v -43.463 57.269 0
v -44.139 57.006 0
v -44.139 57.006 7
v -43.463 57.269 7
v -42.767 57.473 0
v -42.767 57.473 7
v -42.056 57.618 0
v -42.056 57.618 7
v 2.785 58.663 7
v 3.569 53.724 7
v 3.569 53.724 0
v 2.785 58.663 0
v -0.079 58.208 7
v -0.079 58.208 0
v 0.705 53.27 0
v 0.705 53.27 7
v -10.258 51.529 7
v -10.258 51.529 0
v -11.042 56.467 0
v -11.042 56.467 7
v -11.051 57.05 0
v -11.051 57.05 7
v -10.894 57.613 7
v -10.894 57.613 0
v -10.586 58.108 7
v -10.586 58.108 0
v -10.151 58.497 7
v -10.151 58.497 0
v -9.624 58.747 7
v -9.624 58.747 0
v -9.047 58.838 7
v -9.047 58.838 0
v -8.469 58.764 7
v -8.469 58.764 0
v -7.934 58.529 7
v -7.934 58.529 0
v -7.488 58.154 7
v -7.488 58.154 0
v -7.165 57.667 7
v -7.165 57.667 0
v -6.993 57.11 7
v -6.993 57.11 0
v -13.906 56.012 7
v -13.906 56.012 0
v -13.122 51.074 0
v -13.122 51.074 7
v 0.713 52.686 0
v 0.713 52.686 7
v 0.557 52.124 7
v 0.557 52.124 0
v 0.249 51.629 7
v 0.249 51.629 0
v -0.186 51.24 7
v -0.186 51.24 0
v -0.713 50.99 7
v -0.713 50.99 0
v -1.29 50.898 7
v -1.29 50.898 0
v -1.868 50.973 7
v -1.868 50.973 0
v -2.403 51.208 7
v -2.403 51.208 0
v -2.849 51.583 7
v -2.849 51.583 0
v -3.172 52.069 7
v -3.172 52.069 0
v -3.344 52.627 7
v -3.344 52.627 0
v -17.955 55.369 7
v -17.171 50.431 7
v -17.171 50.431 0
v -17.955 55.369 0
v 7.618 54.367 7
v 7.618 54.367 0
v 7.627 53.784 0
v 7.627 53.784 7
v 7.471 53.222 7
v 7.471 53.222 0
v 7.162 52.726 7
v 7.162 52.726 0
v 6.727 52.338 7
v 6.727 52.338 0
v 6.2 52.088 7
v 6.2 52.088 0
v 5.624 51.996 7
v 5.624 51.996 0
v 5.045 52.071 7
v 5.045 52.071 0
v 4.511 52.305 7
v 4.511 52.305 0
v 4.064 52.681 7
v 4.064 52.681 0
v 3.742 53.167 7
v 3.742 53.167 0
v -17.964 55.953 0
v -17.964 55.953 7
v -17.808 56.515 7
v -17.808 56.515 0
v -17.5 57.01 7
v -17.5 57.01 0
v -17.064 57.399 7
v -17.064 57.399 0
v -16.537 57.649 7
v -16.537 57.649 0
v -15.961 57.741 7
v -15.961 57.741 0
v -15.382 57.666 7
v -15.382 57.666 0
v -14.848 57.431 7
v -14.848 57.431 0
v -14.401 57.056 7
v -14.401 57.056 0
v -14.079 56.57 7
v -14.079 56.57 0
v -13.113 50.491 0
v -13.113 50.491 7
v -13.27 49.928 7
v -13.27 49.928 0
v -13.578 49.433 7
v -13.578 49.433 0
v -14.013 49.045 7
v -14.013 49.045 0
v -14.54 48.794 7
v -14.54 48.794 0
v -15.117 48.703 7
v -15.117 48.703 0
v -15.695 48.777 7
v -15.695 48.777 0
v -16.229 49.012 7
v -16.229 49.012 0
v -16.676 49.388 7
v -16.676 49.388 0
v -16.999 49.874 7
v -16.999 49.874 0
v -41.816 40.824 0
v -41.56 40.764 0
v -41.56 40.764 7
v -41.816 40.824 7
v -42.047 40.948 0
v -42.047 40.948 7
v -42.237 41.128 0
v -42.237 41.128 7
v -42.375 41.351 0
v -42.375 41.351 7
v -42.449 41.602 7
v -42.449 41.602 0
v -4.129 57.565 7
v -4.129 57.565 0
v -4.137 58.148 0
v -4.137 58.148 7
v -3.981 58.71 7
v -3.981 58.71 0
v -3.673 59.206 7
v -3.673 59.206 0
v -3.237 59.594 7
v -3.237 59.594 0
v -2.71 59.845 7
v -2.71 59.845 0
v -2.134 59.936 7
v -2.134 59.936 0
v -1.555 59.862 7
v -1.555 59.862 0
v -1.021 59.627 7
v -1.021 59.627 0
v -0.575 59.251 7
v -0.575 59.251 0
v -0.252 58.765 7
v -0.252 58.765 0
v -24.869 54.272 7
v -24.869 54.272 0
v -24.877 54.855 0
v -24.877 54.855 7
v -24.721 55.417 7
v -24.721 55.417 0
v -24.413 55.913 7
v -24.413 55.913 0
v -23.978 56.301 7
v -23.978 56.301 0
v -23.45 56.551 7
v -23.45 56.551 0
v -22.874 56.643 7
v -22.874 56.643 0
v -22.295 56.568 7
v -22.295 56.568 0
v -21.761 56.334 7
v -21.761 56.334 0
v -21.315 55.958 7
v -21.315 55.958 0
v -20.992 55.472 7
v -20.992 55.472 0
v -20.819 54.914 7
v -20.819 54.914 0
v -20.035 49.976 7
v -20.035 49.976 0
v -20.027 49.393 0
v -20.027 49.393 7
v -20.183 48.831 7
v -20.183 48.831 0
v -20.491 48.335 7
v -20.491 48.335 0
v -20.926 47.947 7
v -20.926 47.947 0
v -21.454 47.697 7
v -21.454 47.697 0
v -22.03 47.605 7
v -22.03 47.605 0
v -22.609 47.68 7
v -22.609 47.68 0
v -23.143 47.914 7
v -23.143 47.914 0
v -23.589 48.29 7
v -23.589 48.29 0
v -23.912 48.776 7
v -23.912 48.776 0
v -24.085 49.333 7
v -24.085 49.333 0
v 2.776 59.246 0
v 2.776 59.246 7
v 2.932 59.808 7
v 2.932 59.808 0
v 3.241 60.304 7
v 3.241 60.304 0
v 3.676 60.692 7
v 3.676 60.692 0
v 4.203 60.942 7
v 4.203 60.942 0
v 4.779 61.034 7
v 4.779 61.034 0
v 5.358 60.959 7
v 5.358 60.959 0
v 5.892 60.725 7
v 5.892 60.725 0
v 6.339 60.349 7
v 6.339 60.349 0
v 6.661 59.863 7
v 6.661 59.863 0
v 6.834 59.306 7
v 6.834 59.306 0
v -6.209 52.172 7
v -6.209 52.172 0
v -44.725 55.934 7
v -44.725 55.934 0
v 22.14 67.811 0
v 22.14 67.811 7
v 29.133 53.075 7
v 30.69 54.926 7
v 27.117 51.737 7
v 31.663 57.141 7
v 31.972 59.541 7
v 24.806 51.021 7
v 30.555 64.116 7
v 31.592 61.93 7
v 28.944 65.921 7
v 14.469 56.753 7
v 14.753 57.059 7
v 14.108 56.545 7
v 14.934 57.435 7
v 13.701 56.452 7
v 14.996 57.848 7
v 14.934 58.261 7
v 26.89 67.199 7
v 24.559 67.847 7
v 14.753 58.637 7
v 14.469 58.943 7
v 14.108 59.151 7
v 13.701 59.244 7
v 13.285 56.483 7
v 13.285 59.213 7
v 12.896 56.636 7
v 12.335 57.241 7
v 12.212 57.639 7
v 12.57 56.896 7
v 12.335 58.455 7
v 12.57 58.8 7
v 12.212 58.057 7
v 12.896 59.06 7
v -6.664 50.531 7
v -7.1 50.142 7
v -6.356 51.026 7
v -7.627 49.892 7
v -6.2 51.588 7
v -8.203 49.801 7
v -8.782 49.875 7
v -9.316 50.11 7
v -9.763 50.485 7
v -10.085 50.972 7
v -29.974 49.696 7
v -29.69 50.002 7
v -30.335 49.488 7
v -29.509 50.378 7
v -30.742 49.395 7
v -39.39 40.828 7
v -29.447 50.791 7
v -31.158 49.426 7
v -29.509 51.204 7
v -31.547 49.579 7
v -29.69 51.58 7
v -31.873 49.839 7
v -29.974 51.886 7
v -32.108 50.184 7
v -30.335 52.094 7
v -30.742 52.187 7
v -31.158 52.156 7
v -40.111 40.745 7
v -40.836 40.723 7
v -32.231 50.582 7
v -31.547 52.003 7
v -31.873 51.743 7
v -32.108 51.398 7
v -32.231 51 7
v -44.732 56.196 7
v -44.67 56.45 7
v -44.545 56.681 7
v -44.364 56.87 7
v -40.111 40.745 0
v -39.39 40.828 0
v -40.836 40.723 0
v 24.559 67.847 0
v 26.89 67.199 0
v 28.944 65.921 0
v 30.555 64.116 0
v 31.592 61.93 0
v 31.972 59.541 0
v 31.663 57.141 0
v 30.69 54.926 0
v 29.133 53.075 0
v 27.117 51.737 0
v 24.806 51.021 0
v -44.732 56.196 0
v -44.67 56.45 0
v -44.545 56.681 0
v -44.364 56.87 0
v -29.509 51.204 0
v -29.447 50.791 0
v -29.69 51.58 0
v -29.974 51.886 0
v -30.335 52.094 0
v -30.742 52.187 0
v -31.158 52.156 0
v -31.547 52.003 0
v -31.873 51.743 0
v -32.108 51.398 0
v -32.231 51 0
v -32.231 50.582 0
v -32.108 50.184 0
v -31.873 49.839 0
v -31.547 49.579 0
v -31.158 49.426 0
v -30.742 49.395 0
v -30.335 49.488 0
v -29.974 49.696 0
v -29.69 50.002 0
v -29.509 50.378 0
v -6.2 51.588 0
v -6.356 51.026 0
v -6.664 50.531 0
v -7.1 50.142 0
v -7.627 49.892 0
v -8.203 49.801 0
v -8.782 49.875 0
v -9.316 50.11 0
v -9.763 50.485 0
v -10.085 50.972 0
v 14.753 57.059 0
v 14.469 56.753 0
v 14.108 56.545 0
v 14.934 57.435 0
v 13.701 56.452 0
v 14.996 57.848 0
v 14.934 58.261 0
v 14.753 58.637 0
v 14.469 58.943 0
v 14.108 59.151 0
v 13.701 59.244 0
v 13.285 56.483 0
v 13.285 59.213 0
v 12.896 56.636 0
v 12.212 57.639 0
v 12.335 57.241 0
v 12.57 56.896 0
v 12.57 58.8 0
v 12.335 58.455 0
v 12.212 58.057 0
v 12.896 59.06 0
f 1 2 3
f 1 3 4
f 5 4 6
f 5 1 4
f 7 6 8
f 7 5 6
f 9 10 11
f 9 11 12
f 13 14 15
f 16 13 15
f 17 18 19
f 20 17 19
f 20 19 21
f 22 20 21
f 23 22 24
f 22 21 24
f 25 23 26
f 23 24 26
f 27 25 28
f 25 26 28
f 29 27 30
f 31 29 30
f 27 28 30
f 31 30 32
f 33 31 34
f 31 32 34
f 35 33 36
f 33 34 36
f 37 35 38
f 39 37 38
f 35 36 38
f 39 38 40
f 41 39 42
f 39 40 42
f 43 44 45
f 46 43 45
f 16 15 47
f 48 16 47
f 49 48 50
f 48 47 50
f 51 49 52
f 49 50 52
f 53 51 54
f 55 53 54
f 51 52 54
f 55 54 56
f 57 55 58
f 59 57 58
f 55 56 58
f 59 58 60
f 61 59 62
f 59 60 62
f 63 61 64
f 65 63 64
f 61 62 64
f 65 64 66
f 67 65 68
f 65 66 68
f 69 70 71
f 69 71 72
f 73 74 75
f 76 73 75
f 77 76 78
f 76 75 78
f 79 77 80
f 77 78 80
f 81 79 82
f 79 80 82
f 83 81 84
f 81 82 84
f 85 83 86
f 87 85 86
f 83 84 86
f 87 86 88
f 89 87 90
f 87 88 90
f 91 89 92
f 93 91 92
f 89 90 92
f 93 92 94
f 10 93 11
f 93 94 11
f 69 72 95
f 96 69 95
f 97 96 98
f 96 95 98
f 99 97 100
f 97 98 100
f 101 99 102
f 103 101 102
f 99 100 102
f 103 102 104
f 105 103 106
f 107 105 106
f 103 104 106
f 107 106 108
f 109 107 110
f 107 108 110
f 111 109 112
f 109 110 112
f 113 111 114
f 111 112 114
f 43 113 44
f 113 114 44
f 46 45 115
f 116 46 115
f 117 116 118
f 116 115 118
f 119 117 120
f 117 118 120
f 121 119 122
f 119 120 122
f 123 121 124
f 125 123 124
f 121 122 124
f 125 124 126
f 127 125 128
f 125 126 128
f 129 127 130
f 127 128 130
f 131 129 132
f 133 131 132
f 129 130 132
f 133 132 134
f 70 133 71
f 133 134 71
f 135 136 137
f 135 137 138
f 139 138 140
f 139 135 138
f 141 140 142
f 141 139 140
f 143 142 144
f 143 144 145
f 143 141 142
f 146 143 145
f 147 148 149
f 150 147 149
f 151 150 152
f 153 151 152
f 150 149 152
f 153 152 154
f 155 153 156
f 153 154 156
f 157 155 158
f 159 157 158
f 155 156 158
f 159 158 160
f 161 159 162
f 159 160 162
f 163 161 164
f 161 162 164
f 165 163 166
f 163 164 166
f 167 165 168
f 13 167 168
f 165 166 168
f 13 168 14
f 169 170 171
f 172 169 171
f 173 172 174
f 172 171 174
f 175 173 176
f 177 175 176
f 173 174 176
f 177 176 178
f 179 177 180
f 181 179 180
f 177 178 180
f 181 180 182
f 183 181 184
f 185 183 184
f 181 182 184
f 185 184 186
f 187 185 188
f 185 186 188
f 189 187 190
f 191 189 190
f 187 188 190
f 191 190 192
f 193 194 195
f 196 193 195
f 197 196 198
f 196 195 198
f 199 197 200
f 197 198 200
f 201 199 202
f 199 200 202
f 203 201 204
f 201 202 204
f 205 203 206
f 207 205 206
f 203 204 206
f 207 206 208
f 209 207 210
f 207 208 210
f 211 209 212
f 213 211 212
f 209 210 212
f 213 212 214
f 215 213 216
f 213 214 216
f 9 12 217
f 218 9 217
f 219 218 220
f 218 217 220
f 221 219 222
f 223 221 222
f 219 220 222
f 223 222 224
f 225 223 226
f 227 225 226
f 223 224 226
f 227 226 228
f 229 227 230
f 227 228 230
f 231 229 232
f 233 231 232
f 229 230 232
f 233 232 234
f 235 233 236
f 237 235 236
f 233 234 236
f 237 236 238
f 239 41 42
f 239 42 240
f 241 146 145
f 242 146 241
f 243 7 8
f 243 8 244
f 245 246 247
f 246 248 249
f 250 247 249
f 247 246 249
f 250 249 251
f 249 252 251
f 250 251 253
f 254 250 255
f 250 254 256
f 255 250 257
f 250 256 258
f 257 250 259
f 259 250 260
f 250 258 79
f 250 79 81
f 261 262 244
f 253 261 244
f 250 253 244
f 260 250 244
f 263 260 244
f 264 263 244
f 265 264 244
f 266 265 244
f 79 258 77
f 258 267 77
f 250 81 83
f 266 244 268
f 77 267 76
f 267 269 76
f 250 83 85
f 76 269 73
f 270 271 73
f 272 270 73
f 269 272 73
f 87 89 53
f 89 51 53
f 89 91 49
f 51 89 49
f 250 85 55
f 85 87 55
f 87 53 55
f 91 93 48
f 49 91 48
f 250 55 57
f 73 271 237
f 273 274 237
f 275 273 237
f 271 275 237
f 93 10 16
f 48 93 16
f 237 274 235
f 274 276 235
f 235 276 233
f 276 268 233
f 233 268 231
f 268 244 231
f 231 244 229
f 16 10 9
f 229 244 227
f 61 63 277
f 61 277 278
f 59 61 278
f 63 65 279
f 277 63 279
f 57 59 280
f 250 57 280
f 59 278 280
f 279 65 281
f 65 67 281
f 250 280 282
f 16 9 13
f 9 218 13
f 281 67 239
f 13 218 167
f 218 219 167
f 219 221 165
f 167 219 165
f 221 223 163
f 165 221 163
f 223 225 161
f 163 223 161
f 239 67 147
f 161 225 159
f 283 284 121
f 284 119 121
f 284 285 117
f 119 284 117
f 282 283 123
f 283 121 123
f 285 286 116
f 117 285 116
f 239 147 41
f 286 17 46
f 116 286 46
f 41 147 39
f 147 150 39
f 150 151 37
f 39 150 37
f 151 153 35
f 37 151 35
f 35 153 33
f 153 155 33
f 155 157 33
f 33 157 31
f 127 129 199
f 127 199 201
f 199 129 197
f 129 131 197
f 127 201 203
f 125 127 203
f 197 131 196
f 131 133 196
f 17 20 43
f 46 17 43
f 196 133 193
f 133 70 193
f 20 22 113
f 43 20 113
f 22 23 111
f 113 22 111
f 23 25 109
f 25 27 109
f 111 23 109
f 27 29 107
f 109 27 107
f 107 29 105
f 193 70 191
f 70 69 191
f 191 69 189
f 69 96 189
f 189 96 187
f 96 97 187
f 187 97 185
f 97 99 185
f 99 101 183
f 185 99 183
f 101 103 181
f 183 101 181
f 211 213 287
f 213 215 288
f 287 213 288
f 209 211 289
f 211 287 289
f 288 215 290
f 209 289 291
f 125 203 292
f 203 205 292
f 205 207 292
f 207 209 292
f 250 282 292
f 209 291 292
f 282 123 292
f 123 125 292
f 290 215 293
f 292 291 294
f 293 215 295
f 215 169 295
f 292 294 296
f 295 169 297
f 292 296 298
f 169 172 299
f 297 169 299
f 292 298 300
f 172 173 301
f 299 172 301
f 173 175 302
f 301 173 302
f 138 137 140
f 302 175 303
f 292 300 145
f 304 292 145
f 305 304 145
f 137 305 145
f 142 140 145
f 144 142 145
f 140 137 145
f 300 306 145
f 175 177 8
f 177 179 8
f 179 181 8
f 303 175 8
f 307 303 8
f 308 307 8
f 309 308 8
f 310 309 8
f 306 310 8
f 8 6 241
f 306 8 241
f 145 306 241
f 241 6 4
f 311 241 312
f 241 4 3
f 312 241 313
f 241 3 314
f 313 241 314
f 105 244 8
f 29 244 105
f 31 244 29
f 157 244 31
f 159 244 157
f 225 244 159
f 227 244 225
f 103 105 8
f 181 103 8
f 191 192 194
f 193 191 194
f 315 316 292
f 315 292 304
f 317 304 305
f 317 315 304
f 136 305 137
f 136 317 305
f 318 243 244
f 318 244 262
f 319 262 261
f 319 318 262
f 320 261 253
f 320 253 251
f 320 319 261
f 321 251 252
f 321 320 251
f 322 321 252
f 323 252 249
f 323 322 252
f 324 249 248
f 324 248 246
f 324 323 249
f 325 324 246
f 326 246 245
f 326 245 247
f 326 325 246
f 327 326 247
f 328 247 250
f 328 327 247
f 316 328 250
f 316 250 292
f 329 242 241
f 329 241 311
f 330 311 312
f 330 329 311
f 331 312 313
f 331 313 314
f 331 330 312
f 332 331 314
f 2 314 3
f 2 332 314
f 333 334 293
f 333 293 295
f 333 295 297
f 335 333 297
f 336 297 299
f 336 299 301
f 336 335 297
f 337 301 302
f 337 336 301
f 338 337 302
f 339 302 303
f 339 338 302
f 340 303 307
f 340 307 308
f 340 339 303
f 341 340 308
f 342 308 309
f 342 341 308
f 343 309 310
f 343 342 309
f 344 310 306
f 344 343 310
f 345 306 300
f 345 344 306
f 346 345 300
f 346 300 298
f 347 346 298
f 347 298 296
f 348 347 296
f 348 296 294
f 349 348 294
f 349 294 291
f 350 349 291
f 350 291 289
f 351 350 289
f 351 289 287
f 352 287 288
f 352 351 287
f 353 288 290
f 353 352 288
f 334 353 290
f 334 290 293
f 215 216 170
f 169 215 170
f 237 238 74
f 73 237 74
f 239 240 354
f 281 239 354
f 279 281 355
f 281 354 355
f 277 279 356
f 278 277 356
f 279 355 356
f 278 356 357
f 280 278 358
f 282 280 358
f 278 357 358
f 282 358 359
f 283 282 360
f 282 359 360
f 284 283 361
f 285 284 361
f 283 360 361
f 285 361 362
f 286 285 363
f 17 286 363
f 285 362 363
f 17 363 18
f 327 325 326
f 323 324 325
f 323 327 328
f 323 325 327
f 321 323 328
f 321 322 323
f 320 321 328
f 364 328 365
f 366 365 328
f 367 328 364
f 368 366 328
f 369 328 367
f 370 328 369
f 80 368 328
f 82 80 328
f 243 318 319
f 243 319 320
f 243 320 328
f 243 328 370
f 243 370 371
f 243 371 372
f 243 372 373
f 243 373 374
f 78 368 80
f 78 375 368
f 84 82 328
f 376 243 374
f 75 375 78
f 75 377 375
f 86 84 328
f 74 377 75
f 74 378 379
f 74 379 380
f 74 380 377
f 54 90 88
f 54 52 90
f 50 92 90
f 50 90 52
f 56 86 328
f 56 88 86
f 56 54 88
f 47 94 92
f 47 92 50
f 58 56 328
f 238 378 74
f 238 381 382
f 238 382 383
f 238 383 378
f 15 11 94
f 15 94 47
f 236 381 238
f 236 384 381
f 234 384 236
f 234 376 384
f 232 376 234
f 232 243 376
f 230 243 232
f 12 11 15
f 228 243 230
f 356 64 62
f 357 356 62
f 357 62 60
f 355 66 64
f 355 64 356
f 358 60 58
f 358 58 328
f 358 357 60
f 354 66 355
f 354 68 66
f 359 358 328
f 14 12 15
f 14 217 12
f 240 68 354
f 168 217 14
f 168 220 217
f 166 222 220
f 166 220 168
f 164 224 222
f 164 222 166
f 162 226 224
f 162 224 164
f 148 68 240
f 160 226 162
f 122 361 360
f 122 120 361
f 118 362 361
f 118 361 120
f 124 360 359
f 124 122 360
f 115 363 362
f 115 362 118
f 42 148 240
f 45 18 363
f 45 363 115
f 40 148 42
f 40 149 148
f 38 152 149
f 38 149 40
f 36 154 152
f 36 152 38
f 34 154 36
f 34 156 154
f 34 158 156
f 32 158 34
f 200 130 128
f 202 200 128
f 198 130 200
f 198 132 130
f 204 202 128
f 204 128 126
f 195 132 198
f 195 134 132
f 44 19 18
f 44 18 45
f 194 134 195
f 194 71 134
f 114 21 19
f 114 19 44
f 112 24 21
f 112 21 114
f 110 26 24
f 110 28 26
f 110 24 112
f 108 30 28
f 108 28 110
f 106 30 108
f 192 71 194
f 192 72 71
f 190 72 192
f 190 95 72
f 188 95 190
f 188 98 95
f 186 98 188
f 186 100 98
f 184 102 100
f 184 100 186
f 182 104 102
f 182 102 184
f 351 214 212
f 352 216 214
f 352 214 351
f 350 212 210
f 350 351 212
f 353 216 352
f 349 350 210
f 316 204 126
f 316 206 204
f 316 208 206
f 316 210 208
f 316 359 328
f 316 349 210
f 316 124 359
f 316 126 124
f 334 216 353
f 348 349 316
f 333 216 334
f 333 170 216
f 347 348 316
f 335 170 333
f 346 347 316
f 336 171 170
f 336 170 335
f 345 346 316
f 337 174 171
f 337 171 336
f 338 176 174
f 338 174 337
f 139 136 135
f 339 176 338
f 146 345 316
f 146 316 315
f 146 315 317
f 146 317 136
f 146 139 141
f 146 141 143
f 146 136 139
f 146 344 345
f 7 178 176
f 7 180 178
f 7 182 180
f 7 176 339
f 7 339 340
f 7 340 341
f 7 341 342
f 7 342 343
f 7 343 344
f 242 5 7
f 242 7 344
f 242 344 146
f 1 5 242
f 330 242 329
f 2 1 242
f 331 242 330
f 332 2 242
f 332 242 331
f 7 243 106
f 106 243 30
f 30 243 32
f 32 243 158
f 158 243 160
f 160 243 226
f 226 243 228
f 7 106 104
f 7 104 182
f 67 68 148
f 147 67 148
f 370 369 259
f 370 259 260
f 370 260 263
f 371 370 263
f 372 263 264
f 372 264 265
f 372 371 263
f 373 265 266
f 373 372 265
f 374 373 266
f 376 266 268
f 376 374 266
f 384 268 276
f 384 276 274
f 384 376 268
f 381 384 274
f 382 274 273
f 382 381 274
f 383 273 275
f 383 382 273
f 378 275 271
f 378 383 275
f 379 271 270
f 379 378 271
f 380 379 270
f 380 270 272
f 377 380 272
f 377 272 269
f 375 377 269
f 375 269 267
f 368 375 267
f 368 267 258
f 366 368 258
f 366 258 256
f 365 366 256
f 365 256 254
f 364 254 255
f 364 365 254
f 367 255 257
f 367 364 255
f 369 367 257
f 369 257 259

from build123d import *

# Parameters (mm, degrees)
SKETCH_1_R      = 1.4
EXTRUDE_1_DEPTH = 7


with BuildPart() as part:
    # 草图1 → 凸台-拉伸1 (new body)
    with BuildSketch(Plane.XY):
        with BuildLine():
            Line((-42.056135012, 57.617545139), (22.139601015, 67.811046791))
            ThreePointArc((22.139601015, 67.811046791), (31.867424404, 60.749216142), (24.805593755, 51.021392753))
            Line((24.805593755, 51.021392753), (-39.390142272, 40.827891101))
            ThreePointArc((-39.390142272, 40.827891101), (-40.473181997, 40.726394111), (-41.560315394, 40.764045938))
            ThreePointArc((-41.560315394, 40.764045938), (-42.147831339, 41.031589211), (-42.44945072, 41.60236074))
            Line((-42.44945072, 41.60236074), (-44.725061471, 55.933501507))
            ThreePointArc((-44.725061471, 55.933501507), (-44.615083087, 56.569629752), (-44.139340913, 57.006005475))
            ThreePointArc((-44.139340913, 57.006005475), (-43.117343546, 57.378561601), (-42.056135012, 57.617545139))
        make_face()
        with Locations((-30.846871561, 50.790949144)):
            Circle(SKETCH_1_R, mode=Mode.SUBTRACT)
        with Locations((13.596330304, 57.847988749)):
            Circle(SKETCH_1_R, mode=Mode.SUBTRACT)
        with BuildLine():
            Line((6.834080281, 59.305546509), (7.618195793, 54.367412968))
            ThreePointArc((7.618195793, 54.367412968), (5.915048401, 52.021290857), (3.568926289, 53.724438249))
            Line((3.568926289, 53.724438249), (2.784810778, 58.662571789))
            ThreePointArc((2.784810778, 58.662571789), (4.48795817, 61.008693901), (6.834080281, 59.305546509))
        make_face(mode=Mode.SUBTRACT)
        with BuildLine():
            Line((-0.079306676, 58.207784793), (0.704808836, 53.269651252))
            ThreePointArc((0.704808836, 53.269651252), (-0.998338556, 50.923529141), (-3.344460667, 52.626676532))
            Line((-3.344460667, 52.626676532), (-4.128576179, 57.564810073))
            ThreePointArc((-4.128576179, 57.564810073), (-2.425428787, 59.910932184), (-0.079306676, 58.207784793))
        make_face(mode=Mode.SUBTRACT)
        with BuildLine():
            Line((-6.992693633, 57.110023076), (-6.208578121, 52.171889536))
            ThreePointArc((-6.208578121, 52.171889536), (-7.911725513, 49.825767424), (-10.257847624, 51.528914816))
            Line((-10.257847624, 51.528914816), (-11.041963136, 56.467048357))
            ThreePointArc((-11.041963136, 56.467048357), (-9.338815744, 58.813170468), (-6.992693633, 57.110023076))
        make_face(mode=Mode.SUBTRACT)
        with BuildLine():
            Line((-13.906080589, 56.01226136), (-13.121965078, 51.074127819))
            ThreePointArc((-13.121965078, 51.074127819), (-14.82511247, 48.728005708), (-17.171234581, 50.4311531))
            Line((-17.171234581, 50.4311531), (-17.955350093, 55.36928664))
            ThreePointArc((-17.955350093, 55.36928664), (-16.252202701, 57.715408752), (-13.906080589, 56.01226136))
        make_face(mode=Mode.SUBTRACT)
        with BuildLine():
            Line((-20.819467546, 54.914499643), (-20.035352035, 49.976366103))
            ThreePointArc((-20.035352035, 49.976366103), (-21.738499426, 47.630243992), (-24.084621538, 49.333391383))
            Line((-24.084621538, 49.333391383), (-24.868737049, 54.271524924))
            ThreePointArc((-24.868737049, 54.271524924), (-23.165589658, 56.617647035), (-20.819467546, 54.914499643))
        make_face(mode=Mode.SUBTRACT)
    extrude(amount=EXTRUDE_1_DEPTH)


solid = part.part
